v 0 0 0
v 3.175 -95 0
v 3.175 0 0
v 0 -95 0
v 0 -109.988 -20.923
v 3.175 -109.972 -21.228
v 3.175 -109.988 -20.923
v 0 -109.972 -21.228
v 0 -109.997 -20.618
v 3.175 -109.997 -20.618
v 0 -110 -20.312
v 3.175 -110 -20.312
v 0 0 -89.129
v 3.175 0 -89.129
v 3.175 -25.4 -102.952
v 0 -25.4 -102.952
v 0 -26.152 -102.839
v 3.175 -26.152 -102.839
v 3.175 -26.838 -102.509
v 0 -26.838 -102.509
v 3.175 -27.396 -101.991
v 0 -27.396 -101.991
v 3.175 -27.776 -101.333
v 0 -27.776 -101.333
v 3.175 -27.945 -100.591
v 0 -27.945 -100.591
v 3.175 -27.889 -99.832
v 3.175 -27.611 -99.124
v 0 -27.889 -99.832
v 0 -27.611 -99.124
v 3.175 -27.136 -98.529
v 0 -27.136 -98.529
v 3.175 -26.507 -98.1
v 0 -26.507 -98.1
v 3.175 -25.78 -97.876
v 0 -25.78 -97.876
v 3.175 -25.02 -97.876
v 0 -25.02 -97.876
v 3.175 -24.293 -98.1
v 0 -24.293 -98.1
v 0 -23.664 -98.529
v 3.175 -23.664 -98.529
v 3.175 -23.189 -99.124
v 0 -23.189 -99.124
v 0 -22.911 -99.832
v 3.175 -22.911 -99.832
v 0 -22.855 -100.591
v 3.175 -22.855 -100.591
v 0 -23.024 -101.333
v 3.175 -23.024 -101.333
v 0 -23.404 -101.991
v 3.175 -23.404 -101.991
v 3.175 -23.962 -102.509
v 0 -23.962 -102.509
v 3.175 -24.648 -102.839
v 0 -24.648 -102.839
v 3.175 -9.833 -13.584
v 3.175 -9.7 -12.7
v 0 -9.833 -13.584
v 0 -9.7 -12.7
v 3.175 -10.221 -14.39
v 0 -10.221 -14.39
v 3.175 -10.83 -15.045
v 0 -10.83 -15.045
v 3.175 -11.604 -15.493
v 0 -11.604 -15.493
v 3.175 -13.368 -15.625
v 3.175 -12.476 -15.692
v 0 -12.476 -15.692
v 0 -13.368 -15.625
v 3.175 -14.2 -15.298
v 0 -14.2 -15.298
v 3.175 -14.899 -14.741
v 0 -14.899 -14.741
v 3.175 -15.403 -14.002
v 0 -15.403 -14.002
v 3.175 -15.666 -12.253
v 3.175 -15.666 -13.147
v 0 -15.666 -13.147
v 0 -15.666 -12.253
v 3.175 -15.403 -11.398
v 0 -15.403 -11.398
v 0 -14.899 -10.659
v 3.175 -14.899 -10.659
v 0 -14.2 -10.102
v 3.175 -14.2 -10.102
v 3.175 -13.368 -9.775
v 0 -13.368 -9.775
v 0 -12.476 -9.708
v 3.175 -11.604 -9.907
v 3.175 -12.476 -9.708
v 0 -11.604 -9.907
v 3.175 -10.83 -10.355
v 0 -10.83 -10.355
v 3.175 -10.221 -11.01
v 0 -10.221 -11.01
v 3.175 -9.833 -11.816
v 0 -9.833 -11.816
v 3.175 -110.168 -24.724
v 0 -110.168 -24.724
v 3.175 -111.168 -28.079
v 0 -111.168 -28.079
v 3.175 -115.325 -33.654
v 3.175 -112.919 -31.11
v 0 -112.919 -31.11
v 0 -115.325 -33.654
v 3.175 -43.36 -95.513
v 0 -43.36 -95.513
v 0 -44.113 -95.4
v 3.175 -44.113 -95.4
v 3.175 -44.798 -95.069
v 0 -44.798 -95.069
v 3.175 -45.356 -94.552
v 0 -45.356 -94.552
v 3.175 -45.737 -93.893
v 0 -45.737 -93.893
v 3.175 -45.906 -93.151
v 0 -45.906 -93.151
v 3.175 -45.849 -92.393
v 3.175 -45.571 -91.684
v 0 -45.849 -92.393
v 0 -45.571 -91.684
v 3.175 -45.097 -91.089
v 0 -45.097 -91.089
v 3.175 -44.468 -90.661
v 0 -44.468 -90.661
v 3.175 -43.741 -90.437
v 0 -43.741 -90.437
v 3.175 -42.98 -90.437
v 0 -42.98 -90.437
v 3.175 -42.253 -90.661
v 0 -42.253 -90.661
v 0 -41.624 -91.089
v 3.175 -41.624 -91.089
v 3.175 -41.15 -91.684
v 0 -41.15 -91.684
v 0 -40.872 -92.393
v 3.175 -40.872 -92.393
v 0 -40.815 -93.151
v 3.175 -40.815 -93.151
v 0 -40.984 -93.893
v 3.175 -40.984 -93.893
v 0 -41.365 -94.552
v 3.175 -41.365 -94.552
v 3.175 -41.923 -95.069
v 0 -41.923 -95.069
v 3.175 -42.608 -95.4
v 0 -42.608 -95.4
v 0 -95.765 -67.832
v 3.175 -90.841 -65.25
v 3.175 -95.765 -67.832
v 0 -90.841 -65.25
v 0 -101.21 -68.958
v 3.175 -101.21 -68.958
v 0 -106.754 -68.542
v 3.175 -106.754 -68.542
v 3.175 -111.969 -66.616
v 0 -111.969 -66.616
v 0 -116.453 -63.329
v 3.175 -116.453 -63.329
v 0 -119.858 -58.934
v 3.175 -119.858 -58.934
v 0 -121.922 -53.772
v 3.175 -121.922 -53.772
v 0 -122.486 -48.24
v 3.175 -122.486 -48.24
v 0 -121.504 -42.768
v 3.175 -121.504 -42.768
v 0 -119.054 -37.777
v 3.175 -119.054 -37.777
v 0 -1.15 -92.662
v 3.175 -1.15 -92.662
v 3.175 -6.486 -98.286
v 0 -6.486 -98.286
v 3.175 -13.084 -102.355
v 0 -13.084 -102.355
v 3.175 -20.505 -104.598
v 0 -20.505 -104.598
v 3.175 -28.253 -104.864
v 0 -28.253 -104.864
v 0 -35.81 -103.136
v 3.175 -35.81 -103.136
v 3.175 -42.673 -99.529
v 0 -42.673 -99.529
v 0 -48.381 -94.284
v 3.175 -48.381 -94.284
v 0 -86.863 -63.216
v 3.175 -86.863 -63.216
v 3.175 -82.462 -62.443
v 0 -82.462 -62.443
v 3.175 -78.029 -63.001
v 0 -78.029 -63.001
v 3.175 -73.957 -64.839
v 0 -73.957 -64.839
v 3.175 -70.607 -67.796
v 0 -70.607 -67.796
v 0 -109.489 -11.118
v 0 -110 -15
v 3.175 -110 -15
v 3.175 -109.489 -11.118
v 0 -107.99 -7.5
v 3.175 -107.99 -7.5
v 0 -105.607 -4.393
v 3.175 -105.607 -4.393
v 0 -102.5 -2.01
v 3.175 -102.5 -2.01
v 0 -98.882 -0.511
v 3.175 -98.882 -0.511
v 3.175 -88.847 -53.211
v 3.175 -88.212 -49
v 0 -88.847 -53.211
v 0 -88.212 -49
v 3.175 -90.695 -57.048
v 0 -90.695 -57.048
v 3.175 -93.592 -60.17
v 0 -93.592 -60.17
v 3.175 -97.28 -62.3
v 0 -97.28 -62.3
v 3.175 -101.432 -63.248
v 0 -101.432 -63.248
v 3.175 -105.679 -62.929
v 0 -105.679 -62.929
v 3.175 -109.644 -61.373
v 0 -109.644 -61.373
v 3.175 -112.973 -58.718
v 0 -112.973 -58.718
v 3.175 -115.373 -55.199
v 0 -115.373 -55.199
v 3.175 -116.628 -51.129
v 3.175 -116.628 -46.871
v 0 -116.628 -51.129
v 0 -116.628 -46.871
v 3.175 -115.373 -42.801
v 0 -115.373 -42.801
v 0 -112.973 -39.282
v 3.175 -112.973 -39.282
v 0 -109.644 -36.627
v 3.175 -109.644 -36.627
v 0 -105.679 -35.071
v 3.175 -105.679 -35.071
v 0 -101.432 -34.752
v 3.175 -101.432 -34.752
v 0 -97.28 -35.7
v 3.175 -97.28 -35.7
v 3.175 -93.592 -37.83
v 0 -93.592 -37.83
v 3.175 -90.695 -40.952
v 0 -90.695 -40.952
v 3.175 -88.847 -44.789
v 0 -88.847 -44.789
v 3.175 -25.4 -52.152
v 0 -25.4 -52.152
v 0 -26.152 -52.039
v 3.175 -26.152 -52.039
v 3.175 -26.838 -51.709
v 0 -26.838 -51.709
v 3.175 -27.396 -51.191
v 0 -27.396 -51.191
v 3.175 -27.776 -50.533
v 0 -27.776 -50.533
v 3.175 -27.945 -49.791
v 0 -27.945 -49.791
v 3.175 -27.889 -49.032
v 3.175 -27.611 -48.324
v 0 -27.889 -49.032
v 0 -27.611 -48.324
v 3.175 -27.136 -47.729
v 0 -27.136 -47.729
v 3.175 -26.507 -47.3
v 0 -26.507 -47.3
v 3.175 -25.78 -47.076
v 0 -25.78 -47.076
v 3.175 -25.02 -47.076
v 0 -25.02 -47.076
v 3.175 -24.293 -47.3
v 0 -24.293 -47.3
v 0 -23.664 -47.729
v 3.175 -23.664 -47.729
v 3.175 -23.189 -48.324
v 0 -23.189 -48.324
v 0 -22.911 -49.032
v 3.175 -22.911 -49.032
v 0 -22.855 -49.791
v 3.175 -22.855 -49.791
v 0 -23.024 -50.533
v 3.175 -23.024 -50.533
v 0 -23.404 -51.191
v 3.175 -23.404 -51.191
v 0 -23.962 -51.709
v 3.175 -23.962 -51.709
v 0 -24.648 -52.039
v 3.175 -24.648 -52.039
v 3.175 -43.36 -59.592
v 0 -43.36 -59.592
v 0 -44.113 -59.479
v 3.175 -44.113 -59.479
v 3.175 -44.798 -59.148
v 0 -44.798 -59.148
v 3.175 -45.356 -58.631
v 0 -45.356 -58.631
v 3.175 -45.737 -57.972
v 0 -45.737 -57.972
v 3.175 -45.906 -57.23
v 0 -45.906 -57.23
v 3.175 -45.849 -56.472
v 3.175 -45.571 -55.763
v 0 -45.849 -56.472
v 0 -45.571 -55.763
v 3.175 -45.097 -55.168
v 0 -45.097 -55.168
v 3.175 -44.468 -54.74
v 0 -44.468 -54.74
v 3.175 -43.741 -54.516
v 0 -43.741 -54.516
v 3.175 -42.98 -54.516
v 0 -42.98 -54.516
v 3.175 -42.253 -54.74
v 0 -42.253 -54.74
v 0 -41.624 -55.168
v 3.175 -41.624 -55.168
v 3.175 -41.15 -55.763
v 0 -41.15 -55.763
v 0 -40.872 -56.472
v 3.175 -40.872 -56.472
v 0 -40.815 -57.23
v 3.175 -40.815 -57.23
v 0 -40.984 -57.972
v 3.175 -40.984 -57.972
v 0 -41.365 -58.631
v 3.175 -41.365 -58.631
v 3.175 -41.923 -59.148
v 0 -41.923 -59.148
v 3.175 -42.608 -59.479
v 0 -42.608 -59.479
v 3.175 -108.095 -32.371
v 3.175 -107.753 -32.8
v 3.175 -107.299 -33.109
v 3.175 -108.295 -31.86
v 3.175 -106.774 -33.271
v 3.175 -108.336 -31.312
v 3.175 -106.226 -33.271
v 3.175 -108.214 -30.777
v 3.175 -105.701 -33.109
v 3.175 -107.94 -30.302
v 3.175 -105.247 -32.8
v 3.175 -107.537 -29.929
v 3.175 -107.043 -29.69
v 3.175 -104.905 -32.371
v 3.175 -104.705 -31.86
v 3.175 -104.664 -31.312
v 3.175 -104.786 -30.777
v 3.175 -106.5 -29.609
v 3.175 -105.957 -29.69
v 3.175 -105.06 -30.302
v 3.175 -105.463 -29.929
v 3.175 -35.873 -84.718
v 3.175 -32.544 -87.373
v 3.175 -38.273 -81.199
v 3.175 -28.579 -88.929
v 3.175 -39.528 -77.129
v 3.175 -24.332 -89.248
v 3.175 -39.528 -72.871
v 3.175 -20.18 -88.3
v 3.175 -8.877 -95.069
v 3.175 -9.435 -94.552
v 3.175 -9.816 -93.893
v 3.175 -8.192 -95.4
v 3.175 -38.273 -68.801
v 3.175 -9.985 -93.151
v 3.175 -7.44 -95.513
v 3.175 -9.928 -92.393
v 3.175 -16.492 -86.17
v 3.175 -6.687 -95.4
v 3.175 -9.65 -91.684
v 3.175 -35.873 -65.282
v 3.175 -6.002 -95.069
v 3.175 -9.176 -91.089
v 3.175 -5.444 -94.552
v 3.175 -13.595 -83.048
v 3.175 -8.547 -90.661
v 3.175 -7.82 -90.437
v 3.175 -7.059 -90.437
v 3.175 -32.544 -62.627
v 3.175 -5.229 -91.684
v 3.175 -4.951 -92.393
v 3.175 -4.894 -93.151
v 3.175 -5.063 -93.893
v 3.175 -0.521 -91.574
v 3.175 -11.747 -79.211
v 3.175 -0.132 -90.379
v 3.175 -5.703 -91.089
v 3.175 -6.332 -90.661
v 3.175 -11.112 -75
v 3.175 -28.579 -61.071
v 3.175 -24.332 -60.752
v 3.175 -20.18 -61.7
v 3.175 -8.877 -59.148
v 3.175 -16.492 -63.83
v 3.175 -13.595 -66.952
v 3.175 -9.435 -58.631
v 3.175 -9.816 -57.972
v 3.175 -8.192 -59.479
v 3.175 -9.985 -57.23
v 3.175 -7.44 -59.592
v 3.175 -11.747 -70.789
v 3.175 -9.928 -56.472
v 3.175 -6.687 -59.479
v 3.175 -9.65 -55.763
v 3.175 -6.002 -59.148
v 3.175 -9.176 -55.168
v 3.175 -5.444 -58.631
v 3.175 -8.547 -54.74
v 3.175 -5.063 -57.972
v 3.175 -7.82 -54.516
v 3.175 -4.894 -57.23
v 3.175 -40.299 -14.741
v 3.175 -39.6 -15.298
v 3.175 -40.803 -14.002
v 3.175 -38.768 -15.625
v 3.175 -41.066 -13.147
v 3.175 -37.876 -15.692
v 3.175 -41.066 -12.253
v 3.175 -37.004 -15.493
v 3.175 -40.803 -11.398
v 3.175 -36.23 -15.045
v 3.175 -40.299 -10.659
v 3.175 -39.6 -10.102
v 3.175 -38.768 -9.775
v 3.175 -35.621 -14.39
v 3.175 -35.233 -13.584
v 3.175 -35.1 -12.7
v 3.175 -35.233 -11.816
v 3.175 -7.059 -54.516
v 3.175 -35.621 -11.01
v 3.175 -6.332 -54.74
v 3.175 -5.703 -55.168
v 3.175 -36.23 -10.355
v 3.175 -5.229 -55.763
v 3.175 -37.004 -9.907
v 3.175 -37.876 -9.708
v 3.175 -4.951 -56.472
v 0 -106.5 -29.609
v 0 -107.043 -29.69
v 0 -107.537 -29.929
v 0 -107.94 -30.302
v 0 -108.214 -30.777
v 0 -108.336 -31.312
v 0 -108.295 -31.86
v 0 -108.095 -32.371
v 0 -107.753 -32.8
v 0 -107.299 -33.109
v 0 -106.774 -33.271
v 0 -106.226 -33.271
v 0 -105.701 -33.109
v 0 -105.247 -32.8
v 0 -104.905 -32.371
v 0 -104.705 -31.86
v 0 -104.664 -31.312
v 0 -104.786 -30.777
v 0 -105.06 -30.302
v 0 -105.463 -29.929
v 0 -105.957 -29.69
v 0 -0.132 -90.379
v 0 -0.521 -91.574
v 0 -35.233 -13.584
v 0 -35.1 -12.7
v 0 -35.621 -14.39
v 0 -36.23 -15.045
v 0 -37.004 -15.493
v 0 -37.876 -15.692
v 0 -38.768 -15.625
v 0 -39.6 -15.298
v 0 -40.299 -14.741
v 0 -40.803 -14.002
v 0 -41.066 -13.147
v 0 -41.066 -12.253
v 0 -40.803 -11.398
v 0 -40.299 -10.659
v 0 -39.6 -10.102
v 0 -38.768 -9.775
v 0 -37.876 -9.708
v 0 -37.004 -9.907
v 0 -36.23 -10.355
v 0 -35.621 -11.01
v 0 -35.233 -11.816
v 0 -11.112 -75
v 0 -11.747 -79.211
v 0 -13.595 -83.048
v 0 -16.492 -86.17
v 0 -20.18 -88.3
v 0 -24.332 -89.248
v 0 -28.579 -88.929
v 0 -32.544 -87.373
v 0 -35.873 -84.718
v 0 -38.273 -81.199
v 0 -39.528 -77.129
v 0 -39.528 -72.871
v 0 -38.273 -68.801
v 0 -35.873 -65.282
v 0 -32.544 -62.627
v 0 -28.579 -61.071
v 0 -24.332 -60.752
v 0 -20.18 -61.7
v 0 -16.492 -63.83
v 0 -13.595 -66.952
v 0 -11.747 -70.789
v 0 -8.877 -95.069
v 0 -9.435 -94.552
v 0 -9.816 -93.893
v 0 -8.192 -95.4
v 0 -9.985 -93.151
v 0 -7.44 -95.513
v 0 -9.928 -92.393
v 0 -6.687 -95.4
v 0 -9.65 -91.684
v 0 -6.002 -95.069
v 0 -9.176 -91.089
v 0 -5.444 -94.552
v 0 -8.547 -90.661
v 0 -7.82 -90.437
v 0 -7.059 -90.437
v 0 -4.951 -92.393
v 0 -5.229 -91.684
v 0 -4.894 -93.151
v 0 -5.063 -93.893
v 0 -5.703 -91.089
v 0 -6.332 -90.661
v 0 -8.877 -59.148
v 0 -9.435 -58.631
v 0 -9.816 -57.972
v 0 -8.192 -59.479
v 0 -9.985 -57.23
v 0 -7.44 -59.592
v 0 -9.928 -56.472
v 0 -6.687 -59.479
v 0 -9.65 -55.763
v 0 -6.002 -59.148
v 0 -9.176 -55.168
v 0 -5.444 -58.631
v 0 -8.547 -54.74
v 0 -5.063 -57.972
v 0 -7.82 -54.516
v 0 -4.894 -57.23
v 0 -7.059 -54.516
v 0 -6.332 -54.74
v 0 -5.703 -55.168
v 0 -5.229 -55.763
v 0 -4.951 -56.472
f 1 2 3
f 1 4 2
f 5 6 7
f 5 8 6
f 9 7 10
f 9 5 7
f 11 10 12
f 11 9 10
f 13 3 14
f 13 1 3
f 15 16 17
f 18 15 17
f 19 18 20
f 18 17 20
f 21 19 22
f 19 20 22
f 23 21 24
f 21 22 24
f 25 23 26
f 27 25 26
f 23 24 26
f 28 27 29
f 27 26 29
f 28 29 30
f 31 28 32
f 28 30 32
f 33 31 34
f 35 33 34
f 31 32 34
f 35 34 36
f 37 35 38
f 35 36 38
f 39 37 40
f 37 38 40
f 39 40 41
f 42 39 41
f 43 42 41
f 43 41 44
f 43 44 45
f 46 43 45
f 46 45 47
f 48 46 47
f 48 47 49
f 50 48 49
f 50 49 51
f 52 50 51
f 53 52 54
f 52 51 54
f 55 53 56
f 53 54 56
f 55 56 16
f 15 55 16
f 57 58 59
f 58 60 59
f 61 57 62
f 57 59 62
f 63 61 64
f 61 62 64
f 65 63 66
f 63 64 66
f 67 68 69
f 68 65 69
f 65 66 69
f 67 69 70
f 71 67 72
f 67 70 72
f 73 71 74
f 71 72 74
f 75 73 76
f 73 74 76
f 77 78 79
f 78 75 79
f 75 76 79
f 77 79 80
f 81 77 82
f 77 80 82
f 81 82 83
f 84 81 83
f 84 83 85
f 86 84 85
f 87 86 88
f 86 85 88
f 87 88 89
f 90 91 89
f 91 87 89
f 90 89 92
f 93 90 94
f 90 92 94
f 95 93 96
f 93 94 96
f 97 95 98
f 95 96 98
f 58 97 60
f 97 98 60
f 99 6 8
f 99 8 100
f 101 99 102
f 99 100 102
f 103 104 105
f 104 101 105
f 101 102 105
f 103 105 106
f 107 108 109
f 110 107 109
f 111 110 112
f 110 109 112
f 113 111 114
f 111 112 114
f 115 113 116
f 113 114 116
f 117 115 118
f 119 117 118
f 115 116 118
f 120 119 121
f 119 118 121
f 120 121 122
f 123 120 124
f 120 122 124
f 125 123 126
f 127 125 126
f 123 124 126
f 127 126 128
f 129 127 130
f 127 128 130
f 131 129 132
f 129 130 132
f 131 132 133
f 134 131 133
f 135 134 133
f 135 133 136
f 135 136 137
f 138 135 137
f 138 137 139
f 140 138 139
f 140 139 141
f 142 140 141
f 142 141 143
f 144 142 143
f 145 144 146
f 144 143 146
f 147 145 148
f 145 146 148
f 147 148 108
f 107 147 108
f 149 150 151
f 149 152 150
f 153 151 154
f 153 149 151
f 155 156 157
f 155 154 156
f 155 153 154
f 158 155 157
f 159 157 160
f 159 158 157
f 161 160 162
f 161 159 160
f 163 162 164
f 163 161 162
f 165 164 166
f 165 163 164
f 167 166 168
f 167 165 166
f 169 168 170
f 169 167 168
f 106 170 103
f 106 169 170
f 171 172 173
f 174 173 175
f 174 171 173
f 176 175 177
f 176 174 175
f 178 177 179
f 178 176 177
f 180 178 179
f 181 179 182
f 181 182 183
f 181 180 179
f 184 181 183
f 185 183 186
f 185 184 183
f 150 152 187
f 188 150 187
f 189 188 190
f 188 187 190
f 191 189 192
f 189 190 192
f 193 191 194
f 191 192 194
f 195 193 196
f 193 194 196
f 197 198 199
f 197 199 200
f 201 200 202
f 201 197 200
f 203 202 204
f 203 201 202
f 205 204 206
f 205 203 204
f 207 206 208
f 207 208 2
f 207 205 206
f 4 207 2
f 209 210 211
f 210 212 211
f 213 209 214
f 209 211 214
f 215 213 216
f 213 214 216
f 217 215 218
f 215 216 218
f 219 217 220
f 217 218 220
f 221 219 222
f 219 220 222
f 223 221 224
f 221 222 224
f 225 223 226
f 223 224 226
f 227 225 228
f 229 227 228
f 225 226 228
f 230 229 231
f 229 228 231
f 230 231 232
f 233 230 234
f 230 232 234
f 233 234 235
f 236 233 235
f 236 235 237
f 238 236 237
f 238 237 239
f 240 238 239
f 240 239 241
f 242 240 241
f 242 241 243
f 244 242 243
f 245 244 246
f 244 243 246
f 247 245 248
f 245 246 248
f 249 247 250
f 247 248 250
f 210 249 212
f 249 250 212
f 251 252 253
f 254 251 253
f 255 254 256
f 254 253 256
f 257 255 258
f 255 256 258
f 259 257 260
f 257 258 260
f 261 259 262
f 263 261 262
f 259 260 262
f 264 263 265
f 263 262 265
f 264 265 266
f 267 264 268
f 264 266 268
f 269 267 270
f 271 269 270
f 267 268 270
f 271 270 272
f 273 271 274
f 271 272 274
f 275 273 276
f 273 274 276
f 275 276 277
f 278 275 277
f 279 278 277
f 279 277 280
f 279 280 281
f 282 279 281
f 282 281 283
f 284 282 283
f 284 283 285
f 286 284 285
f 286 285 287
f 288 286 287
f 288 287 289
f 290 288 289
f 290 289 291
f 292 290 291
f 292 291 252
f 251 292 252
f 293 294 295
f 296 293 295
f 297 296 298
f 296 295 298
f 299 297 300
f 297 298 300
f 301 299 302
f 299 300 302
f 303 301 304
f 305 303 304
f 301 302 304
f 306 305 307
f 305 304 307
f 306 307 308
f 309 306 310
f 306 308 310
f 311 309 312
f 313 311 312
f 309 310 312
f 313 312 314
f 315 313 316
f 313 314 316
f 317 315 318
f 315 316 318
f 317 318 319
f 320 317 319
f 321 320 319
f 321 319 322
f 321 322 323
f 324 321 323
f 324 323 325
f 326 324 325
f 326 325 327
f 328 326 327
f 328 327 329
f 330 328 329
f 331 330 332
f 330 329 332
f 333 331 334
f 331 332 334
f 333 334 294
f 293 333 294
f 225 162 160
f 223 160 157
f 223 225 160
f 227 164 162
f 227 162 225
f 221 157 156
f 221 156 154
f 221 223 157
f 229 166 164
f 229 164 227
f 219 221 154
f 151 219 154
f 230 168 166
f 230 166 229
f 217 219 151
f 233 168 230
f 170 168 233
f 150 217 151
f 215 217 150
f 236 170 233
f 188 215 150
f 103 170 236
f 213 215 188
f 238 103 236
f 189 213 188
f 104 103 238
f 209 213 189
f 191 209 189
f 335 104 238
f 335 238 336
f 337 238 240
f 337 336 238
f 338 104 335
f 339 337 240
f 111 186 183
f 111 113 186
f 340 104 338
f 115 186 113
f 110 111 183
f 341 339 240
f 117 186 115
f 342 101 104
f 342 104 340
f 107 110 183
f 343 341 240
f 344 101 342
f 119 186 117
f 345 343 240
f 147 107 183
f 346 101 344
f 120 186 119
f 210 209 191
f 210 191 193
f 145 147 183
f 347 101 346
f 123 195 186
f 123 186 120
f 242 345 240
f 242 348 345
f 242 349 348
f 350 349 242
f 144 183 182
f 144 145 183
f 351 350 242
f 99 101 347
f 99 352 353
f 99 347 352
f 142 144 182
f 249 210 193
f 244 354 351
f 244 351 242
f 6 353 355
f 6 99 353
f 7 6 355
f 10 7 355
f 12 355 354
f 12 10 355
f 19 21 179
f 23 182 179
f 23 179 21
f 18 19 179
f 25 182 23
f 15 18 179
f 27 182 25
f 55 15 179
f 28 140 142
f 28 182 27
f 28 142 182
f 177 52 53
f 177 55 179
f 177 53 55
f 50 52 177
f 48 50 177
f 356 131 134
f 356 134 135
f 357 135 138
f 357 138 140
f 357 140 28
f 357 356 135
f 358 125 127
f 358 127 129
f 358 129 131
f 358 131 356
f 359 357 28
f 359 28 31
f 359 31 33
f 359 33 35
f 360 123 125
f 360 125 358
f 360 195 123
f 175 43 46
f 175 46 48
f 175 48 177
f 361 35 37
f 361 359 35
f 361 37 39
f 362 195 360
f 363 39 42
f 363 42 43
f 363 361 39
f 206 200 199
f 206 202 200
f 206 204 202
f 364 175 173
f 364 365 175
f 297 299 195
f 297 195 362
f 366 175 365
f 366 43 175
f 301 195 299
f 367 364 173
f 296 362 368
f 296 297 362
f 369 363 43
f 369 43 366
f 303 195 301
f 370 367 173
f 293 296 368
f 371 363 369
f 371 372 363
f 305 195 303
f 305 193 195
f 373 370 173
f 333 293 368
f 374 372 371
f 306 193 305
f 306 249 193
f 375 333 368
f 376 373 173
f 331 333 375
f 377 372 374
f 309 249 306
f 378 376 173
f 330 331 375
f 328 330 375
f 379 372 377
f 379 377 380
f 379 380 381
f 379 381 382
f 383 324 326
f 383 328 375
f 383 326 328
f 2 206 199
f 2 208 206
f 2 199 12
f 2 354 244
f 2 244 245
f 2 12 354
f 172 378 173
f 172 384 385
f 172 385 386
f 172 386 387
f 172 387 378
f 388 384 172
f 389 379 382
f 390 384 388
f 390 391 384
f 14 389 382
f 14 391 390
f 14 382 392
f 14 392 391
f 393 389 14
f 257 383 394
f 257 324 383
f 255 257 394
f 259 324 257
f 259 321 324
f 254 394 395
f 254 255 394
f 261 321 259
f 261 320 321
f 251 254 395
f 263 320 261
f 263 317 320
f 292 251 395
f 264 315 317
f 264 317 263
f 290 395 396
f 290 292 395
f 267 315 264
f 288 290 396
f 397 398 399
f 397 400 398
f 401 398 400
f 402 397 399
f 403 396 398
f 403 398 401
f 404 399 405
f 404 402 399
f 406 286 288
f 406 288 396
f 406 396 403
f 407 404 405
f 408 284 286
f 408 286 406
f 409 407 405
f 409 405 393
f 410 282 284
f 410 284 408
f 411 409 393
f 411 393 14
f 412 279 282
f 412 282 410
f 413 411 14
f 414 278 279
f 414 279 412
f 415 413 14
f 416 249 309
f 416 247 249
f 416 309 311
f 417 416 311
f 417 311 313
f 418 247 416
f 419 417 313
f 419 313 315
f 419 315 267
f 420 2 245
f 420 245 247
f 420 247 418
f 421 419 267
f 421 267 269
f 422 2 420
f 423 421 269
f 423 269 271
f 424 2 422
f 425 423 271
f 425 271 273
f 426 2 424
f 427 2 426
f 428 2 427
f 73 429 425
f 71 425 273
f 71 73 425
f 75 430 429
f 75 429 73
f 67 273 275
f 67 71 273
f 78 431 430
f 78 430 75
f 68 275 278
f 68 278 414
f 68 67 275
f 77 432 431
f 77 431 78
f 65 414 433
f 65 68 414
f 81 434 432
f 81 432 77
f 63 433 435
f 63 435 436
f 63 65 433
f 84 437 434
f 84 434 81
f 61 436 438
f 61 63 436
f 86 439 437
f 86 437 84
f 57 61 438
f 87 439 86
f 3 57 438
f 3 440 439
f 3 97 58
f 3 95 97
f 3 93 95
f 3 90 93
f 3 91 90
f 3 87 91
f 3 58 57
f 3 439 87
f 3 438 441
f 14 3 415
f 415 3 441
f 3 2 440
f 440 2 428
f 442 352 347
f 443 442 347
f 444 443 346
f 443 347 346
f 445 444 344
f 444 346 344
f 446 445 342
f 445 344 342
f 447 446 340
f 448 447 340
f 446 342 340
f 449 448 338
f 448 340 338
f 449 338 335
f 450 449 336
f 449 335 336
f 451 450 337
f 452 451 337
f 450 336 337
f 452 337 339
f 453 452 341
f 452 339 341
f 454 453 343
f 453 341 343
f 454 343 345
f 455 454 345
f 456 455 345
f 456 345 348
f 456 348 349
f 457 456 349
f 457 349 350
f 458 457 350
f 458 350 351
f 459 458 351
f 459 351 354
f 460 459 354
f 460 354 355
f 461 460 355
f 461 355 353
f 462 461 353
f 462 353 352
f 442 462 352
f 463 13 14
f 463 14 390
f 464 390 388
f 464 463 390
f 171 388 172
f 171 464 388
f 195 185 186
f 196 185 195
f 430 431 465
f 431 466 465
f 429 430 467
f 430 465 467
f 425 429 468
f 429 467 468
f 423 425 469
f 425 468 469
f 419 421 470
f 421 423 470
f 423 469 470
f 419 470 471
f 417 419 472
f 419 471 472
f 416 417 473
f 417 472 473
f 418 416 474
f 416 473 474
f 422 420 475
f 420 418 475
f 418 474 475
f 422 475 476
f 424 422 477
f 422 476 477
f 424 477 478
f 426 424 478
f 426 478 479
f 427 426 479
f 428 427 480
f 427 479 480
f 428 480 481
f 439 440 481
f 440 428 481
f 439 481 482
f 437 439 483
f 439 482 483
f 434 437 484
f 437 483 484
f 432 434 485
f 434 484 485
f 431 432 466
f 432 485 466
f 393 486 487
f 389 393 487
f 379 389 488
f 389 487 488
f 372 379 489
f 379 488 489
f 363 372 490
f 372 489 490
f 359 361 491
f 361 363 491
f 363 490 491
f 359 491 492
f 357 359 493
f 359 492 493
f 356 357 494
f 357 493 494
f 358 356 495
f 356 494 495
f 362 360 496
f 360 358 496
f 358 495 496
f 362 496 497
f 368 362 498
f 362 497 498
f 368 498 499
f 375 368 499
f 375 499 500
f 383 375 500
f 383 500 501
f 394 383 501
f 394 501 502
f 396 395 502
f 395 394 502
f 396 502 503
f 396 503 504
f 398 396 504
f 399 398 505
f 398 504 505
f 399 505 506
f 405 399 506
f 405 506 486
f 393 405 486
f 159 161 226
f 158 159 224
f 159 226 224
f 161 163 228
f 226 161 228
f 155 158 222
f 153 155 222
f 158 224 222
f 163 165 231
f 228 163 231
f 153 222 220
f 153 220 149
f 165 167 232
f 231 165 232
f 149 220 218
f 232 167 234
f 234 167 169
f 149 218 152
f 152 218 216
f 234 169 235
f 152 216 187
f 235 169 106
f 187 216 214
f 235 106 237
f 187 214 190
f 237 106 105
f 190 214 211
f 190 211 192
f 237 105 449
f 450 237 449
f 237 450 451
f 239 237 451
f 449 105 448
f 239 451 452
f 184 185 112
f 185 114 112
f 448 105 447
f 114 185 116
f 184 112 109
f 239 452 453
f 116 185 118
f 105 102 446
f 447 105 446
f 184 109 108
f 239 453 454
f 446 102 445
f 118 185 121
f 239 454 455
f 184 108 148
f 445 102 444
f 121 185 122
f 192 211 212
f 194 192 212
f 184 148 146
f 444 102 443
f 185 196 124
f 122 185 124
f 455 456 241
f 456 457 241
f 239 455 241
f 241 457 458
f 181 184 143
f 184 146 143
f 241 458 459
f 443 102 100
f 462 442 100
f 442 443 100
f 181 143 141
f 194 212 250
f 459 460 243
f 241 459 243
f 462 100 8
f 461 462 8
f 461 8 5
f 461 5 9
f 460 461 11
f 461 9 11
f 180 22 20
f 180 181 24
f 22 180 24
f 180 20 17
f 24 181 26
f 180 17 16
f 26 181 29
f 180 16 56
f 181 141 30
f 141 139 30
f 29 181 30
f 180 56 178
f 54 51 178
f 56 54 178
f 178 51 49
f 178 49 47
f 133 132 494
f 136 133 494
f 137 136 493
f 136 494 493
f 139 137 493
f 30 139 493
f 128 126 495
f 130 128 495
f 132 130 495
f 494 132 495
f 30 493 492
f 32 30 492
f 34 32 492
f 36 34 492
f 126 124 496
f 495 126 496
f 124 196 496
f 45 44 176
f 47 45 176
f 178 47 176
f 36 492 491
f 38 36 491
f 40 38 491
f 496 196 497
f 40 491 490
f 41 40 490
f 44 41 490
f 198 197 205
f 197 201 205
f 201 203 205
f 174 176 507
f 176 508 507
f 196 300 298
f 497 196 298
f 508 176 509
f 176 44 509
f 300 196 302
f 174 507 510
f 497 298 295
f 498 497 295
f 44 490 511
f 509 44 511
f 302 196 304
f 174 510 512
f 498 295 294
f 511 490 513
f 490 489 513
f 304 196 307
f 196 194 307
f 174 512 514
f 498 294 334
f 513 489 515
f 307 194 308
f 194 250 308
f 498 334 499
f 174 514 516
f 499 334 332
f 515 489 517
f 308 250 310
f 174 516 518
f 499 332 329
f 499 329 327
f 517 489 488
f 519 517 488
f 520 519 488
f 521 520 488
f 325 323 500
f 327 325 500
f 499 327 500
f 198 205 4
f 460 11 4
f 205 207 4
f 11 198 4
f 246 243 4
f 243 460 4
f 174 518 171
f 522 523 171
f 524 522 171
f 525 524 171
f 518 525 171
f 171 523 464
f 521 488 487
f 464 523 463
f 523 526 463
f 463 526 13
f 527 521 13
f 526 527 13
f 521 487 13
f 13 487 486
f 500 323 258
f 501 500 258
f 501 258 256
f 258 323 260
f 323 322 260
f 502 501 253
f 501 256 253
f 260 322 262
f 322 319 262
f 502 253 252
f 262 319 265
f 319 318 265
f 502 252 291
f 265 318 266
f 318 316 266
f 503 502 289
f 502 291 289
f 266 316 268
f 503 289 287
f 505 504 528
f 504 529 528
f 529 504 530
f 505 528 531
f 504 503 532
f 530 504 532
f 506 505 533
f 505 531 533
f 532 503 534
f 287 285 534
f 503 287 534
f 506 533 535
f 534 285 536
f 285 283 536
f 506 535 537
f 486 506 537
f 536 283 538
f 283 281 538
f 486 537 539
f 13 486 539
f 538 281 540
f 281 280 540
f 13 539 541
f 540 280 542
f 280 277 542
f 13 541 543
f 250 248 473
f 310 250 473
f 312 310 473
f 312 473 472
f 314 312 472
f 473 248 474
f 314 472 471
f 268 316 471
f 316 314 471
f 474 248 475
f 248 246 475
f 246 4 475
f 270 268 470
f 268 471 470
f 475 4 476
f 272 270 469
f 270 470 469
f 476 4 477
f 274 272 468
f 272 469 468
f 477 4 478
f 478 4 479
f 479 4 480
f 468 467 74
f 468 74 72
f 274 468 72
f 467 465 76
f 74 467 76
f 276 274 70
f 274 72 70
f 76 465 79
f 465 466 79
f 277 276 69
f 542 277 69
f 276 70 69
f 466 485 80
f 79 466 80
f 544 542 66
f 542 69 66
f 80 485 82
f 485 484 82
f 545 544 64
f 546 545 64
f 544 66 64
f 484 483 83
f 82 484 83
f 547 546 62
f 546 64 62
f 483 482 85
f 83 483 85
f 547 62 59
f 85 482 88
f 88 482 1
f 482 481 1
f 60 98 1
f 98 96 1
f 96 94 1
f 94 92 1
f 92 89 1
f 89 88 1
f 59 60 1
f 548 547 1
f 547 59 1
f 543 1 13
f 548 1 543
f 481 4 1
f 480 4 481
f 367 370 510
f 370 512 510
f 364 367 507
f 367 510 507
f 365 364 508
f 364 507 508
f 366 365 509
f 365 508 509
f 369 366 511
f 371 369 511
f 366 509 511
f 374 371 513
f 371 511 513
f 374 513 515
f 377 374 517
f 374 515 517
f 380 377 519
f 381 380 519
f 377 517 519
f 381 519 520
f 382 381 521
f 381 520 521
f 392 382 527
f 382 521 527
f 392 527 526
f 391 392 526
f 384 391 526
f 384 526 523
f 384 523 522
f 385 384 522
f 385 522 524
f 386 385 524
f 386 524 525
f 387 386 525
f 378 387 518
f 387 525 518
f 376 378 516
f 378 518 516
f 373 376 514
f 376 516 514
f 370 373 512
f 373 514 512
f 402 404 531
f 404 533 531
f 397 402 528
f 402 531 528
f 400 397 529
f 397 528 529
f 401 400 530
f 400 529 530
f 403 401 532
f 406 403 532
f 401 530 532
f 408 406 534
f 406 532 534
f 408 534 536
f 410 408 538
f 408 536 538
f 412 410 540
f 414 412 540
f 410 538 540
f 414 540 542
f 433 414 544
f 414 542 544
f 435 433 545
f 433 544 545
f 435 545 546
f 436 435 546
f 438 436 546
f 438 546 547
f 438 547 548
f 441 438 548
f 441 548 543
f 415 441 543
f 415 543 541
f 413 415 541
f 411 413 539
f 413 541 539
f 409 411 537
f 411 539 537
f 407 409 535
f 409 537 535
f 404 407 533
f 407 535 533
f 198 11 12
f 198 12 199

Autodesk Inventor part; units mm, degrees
ref_plane "YZ Plane" through (0, 0, 0) normal (1, 0, 0) x (0, 1, 0)
ref_plane "XZ Plane" through (0, 0, 0) normal (0, 1, 0) x (-1, 0, 0)
ref_plane "XY Plane" through (0, 0, 0) normal (0, 0, 1) x (1, 0, 0)
sketch "Sketch1" plane through (0, 0, 0) normal (1, 0, 0) x (0, 1, 0)
  line L0 (-39.3892, -105) -> (-110, -20.8494)
  line L1 (-110, -20.8494) -> (-110, 0)
  line L2 (-110, 0) -> (0, 0)
  line L3 (0, 0) -> (0, -105)
  line L4 (0, -105) -> (-39.3892, -105)
  line L5 (-110, -20.8494) -> (-119.38, 0) construction
  line L6 (-119.38, 0) -> (-110, 0) construction
  line L7 (-50.8, -25.4) -> (0, -25.4) construction
  line L8 (0, -25.4) -> (0, 0) construction
  line L9 (0, 0) -> (-50.8, 0) construction
  line L10 (-50.8, 0) -> (-50.8, -25.4) construction
  line L11 (-50.8, -25.4) -> (0, 0) construction
  line L12 (0, -25.4) -> (-50.8, 0) construction
  circle A0 centre (-12.7, -12.7) radius 3
  circle A1 centre (-38.1, -12.7) radius 3
  circle A2 centre (-102.5, -49) radius 14.2875
  circle A3 centre (-25.4, -75) radius 14.2875
  circle A4 centre (-102.5, -49) radius 20
  circle A5 centre (-25.4, -75) radius 30
  line L13 (-50.8, -90.9637) -> (-50.8, -59.0363)
  line L14 (-102.5, -49) -> (-25.4, -75) construction
  point P0 (-25.4, -12.7)
  point P1 (-25.4, -25.4)
  point P2 (-103.1519, -29.0106)
  point P3 (-82.9275, -53.1131)
  point P4 (-50.8, -75)
  point P5 (-48.3813, -94.2836)
  point P6 (0, -90.9637)
  dimension "d0" = 50
  dimension "d1" = 119.38
  dimension "d2" = 50.8
  dimension "d3" = 25.4
  dimension "d4" = 25.4
  dimension "d5" = 12.7
  dimension "d6" = 6
  dimension "d7" = 6
  dimension "d8" = 28.575
  dimension "d9" = 102.5
  dimension "d10" = 49
  dimension "d13" = 110
  dimension "d16" = 60
  dimension "d17" = 25.4
  dimension "d18" = 25.4
  dimension "d20" = 40
  dimension "d44" = 81.3659
extrude "Plate1" add sketch "Sketch1" along normal blind 3.175 contours L0 A4 L1 L2 L3 A5 | A5 L13 L3 | A4 L0 A2 | L0 A2 A4 | A5 L13
fillet "Corner Round1" radius 15 4 edges at (1.5875, -82.9275, -53.1131) (1.5875, -103.1519, -29.0106) (1.5875, -110, -20.8494) (1.5875, -110, 0)
fillet "Corner Round1" radius 6 1 edges at (1.5875, 0, -90.9637)
sketch "Sketch2" plane through (0, 0, 0) normal (-1, 0, 0) x (0, 0, 1)
  circle A0 centre (-31.4501, -106.5) radius 4.5847
  circle A1 centre (-49, -102.5) radius 14.2875 projected
  point P0 (0, 0)
  dimension "d21" = 9.1694
  dimension "d22" = 18
  dimension "d23" = 4
hole "Hole1" at (0, -106.5, -31.4501) direction (1, 0, 0) diameter 3.683 end through all thread size "10-24 UNC" class "2B" standard "ANSI Unified Screw Threads"
sketch "Sketch3" plane through (3.175, 0, 0) normal (1, 0, 0) x (0, 0, -1)
  circle A0 centre (75, -25.4) radius 14.2875 projected
  circle A1 centre (75, -25.4) radius 25.4
  line L0 (49.6, -25.4) -> (100.4, -25.4)
  line L1 (92.9605, -7.4395) -> (57.0395, -7.4395)
  line L2 (75, -25.4) -> (57.0395, -7.4395)
  line L3 (92.9605, -43.3605) -> (57.0395, -43.3605)
  line L4 (75, -25.4) -> (92.9605, -43.3605)
  line L5 (25.4, -50.8) -> (0, -50.8)
  line L6 (0, -50.8) -> (0, 0)
  line L7 (0, 0) -> (25.4, 0)
  line L8 (25.4, 0) -> (25.4, -50.8)
  line L9 (25.4, -50.8) -> (0, 0) construction
  line L10 (0, -50.8) -> (25.4, 0) construction
  point P0 (12.7, -25.4)
  dimension "d31" = 50.8
  dimension "d32" = 45
  dimension "d40" = 25.4
  dimension "d41" = 50.8
hole "Hole2" at (3.175, -7.4395, -57.0395) at (3.175, -25.4, -49.6) at (3.175, -43.3605, -57.0395) at (3.175, -43.3605, -92.9605) at (3.175, -25.4, -100.4) at (3.175, -7.4395, -92.9605) direction (-1, 0, 0) diameter 5.105 end through all clearance for "Flat Head Machine Screw (82)" size "#10" standard "Ansi Unified Screw Threads"
equation "\"d5\" = 0.5 * d4"
equation "\"d7\" = d6"
equation "\"d29\" = Thickness"
equation "\"d14\" = Thickness"
equation "\"d18\" = d17"
equation "\"BendRadius\" = Thickness"
equation "\"BendReliefWidth\" = Thickness"
equation "\"BendReliefDepth\" = 0.5 * Thickness"
equation "\"CornerReliefSize\" = 4 * Thickness"
equation "\"MinimumRemnant\" = 2 * Thickness"
equation "\"TransitionRadius\" = BendRadius"
equation "\"JacobiRadiusSize\" = BendRadius"
equation "\"GapSize\" = Thickness"
equation "\"Thickness\" = 3.175"
properties part number "INSIDE_INTAKE_PLATE" material "Aluminum, 6061-T6"
